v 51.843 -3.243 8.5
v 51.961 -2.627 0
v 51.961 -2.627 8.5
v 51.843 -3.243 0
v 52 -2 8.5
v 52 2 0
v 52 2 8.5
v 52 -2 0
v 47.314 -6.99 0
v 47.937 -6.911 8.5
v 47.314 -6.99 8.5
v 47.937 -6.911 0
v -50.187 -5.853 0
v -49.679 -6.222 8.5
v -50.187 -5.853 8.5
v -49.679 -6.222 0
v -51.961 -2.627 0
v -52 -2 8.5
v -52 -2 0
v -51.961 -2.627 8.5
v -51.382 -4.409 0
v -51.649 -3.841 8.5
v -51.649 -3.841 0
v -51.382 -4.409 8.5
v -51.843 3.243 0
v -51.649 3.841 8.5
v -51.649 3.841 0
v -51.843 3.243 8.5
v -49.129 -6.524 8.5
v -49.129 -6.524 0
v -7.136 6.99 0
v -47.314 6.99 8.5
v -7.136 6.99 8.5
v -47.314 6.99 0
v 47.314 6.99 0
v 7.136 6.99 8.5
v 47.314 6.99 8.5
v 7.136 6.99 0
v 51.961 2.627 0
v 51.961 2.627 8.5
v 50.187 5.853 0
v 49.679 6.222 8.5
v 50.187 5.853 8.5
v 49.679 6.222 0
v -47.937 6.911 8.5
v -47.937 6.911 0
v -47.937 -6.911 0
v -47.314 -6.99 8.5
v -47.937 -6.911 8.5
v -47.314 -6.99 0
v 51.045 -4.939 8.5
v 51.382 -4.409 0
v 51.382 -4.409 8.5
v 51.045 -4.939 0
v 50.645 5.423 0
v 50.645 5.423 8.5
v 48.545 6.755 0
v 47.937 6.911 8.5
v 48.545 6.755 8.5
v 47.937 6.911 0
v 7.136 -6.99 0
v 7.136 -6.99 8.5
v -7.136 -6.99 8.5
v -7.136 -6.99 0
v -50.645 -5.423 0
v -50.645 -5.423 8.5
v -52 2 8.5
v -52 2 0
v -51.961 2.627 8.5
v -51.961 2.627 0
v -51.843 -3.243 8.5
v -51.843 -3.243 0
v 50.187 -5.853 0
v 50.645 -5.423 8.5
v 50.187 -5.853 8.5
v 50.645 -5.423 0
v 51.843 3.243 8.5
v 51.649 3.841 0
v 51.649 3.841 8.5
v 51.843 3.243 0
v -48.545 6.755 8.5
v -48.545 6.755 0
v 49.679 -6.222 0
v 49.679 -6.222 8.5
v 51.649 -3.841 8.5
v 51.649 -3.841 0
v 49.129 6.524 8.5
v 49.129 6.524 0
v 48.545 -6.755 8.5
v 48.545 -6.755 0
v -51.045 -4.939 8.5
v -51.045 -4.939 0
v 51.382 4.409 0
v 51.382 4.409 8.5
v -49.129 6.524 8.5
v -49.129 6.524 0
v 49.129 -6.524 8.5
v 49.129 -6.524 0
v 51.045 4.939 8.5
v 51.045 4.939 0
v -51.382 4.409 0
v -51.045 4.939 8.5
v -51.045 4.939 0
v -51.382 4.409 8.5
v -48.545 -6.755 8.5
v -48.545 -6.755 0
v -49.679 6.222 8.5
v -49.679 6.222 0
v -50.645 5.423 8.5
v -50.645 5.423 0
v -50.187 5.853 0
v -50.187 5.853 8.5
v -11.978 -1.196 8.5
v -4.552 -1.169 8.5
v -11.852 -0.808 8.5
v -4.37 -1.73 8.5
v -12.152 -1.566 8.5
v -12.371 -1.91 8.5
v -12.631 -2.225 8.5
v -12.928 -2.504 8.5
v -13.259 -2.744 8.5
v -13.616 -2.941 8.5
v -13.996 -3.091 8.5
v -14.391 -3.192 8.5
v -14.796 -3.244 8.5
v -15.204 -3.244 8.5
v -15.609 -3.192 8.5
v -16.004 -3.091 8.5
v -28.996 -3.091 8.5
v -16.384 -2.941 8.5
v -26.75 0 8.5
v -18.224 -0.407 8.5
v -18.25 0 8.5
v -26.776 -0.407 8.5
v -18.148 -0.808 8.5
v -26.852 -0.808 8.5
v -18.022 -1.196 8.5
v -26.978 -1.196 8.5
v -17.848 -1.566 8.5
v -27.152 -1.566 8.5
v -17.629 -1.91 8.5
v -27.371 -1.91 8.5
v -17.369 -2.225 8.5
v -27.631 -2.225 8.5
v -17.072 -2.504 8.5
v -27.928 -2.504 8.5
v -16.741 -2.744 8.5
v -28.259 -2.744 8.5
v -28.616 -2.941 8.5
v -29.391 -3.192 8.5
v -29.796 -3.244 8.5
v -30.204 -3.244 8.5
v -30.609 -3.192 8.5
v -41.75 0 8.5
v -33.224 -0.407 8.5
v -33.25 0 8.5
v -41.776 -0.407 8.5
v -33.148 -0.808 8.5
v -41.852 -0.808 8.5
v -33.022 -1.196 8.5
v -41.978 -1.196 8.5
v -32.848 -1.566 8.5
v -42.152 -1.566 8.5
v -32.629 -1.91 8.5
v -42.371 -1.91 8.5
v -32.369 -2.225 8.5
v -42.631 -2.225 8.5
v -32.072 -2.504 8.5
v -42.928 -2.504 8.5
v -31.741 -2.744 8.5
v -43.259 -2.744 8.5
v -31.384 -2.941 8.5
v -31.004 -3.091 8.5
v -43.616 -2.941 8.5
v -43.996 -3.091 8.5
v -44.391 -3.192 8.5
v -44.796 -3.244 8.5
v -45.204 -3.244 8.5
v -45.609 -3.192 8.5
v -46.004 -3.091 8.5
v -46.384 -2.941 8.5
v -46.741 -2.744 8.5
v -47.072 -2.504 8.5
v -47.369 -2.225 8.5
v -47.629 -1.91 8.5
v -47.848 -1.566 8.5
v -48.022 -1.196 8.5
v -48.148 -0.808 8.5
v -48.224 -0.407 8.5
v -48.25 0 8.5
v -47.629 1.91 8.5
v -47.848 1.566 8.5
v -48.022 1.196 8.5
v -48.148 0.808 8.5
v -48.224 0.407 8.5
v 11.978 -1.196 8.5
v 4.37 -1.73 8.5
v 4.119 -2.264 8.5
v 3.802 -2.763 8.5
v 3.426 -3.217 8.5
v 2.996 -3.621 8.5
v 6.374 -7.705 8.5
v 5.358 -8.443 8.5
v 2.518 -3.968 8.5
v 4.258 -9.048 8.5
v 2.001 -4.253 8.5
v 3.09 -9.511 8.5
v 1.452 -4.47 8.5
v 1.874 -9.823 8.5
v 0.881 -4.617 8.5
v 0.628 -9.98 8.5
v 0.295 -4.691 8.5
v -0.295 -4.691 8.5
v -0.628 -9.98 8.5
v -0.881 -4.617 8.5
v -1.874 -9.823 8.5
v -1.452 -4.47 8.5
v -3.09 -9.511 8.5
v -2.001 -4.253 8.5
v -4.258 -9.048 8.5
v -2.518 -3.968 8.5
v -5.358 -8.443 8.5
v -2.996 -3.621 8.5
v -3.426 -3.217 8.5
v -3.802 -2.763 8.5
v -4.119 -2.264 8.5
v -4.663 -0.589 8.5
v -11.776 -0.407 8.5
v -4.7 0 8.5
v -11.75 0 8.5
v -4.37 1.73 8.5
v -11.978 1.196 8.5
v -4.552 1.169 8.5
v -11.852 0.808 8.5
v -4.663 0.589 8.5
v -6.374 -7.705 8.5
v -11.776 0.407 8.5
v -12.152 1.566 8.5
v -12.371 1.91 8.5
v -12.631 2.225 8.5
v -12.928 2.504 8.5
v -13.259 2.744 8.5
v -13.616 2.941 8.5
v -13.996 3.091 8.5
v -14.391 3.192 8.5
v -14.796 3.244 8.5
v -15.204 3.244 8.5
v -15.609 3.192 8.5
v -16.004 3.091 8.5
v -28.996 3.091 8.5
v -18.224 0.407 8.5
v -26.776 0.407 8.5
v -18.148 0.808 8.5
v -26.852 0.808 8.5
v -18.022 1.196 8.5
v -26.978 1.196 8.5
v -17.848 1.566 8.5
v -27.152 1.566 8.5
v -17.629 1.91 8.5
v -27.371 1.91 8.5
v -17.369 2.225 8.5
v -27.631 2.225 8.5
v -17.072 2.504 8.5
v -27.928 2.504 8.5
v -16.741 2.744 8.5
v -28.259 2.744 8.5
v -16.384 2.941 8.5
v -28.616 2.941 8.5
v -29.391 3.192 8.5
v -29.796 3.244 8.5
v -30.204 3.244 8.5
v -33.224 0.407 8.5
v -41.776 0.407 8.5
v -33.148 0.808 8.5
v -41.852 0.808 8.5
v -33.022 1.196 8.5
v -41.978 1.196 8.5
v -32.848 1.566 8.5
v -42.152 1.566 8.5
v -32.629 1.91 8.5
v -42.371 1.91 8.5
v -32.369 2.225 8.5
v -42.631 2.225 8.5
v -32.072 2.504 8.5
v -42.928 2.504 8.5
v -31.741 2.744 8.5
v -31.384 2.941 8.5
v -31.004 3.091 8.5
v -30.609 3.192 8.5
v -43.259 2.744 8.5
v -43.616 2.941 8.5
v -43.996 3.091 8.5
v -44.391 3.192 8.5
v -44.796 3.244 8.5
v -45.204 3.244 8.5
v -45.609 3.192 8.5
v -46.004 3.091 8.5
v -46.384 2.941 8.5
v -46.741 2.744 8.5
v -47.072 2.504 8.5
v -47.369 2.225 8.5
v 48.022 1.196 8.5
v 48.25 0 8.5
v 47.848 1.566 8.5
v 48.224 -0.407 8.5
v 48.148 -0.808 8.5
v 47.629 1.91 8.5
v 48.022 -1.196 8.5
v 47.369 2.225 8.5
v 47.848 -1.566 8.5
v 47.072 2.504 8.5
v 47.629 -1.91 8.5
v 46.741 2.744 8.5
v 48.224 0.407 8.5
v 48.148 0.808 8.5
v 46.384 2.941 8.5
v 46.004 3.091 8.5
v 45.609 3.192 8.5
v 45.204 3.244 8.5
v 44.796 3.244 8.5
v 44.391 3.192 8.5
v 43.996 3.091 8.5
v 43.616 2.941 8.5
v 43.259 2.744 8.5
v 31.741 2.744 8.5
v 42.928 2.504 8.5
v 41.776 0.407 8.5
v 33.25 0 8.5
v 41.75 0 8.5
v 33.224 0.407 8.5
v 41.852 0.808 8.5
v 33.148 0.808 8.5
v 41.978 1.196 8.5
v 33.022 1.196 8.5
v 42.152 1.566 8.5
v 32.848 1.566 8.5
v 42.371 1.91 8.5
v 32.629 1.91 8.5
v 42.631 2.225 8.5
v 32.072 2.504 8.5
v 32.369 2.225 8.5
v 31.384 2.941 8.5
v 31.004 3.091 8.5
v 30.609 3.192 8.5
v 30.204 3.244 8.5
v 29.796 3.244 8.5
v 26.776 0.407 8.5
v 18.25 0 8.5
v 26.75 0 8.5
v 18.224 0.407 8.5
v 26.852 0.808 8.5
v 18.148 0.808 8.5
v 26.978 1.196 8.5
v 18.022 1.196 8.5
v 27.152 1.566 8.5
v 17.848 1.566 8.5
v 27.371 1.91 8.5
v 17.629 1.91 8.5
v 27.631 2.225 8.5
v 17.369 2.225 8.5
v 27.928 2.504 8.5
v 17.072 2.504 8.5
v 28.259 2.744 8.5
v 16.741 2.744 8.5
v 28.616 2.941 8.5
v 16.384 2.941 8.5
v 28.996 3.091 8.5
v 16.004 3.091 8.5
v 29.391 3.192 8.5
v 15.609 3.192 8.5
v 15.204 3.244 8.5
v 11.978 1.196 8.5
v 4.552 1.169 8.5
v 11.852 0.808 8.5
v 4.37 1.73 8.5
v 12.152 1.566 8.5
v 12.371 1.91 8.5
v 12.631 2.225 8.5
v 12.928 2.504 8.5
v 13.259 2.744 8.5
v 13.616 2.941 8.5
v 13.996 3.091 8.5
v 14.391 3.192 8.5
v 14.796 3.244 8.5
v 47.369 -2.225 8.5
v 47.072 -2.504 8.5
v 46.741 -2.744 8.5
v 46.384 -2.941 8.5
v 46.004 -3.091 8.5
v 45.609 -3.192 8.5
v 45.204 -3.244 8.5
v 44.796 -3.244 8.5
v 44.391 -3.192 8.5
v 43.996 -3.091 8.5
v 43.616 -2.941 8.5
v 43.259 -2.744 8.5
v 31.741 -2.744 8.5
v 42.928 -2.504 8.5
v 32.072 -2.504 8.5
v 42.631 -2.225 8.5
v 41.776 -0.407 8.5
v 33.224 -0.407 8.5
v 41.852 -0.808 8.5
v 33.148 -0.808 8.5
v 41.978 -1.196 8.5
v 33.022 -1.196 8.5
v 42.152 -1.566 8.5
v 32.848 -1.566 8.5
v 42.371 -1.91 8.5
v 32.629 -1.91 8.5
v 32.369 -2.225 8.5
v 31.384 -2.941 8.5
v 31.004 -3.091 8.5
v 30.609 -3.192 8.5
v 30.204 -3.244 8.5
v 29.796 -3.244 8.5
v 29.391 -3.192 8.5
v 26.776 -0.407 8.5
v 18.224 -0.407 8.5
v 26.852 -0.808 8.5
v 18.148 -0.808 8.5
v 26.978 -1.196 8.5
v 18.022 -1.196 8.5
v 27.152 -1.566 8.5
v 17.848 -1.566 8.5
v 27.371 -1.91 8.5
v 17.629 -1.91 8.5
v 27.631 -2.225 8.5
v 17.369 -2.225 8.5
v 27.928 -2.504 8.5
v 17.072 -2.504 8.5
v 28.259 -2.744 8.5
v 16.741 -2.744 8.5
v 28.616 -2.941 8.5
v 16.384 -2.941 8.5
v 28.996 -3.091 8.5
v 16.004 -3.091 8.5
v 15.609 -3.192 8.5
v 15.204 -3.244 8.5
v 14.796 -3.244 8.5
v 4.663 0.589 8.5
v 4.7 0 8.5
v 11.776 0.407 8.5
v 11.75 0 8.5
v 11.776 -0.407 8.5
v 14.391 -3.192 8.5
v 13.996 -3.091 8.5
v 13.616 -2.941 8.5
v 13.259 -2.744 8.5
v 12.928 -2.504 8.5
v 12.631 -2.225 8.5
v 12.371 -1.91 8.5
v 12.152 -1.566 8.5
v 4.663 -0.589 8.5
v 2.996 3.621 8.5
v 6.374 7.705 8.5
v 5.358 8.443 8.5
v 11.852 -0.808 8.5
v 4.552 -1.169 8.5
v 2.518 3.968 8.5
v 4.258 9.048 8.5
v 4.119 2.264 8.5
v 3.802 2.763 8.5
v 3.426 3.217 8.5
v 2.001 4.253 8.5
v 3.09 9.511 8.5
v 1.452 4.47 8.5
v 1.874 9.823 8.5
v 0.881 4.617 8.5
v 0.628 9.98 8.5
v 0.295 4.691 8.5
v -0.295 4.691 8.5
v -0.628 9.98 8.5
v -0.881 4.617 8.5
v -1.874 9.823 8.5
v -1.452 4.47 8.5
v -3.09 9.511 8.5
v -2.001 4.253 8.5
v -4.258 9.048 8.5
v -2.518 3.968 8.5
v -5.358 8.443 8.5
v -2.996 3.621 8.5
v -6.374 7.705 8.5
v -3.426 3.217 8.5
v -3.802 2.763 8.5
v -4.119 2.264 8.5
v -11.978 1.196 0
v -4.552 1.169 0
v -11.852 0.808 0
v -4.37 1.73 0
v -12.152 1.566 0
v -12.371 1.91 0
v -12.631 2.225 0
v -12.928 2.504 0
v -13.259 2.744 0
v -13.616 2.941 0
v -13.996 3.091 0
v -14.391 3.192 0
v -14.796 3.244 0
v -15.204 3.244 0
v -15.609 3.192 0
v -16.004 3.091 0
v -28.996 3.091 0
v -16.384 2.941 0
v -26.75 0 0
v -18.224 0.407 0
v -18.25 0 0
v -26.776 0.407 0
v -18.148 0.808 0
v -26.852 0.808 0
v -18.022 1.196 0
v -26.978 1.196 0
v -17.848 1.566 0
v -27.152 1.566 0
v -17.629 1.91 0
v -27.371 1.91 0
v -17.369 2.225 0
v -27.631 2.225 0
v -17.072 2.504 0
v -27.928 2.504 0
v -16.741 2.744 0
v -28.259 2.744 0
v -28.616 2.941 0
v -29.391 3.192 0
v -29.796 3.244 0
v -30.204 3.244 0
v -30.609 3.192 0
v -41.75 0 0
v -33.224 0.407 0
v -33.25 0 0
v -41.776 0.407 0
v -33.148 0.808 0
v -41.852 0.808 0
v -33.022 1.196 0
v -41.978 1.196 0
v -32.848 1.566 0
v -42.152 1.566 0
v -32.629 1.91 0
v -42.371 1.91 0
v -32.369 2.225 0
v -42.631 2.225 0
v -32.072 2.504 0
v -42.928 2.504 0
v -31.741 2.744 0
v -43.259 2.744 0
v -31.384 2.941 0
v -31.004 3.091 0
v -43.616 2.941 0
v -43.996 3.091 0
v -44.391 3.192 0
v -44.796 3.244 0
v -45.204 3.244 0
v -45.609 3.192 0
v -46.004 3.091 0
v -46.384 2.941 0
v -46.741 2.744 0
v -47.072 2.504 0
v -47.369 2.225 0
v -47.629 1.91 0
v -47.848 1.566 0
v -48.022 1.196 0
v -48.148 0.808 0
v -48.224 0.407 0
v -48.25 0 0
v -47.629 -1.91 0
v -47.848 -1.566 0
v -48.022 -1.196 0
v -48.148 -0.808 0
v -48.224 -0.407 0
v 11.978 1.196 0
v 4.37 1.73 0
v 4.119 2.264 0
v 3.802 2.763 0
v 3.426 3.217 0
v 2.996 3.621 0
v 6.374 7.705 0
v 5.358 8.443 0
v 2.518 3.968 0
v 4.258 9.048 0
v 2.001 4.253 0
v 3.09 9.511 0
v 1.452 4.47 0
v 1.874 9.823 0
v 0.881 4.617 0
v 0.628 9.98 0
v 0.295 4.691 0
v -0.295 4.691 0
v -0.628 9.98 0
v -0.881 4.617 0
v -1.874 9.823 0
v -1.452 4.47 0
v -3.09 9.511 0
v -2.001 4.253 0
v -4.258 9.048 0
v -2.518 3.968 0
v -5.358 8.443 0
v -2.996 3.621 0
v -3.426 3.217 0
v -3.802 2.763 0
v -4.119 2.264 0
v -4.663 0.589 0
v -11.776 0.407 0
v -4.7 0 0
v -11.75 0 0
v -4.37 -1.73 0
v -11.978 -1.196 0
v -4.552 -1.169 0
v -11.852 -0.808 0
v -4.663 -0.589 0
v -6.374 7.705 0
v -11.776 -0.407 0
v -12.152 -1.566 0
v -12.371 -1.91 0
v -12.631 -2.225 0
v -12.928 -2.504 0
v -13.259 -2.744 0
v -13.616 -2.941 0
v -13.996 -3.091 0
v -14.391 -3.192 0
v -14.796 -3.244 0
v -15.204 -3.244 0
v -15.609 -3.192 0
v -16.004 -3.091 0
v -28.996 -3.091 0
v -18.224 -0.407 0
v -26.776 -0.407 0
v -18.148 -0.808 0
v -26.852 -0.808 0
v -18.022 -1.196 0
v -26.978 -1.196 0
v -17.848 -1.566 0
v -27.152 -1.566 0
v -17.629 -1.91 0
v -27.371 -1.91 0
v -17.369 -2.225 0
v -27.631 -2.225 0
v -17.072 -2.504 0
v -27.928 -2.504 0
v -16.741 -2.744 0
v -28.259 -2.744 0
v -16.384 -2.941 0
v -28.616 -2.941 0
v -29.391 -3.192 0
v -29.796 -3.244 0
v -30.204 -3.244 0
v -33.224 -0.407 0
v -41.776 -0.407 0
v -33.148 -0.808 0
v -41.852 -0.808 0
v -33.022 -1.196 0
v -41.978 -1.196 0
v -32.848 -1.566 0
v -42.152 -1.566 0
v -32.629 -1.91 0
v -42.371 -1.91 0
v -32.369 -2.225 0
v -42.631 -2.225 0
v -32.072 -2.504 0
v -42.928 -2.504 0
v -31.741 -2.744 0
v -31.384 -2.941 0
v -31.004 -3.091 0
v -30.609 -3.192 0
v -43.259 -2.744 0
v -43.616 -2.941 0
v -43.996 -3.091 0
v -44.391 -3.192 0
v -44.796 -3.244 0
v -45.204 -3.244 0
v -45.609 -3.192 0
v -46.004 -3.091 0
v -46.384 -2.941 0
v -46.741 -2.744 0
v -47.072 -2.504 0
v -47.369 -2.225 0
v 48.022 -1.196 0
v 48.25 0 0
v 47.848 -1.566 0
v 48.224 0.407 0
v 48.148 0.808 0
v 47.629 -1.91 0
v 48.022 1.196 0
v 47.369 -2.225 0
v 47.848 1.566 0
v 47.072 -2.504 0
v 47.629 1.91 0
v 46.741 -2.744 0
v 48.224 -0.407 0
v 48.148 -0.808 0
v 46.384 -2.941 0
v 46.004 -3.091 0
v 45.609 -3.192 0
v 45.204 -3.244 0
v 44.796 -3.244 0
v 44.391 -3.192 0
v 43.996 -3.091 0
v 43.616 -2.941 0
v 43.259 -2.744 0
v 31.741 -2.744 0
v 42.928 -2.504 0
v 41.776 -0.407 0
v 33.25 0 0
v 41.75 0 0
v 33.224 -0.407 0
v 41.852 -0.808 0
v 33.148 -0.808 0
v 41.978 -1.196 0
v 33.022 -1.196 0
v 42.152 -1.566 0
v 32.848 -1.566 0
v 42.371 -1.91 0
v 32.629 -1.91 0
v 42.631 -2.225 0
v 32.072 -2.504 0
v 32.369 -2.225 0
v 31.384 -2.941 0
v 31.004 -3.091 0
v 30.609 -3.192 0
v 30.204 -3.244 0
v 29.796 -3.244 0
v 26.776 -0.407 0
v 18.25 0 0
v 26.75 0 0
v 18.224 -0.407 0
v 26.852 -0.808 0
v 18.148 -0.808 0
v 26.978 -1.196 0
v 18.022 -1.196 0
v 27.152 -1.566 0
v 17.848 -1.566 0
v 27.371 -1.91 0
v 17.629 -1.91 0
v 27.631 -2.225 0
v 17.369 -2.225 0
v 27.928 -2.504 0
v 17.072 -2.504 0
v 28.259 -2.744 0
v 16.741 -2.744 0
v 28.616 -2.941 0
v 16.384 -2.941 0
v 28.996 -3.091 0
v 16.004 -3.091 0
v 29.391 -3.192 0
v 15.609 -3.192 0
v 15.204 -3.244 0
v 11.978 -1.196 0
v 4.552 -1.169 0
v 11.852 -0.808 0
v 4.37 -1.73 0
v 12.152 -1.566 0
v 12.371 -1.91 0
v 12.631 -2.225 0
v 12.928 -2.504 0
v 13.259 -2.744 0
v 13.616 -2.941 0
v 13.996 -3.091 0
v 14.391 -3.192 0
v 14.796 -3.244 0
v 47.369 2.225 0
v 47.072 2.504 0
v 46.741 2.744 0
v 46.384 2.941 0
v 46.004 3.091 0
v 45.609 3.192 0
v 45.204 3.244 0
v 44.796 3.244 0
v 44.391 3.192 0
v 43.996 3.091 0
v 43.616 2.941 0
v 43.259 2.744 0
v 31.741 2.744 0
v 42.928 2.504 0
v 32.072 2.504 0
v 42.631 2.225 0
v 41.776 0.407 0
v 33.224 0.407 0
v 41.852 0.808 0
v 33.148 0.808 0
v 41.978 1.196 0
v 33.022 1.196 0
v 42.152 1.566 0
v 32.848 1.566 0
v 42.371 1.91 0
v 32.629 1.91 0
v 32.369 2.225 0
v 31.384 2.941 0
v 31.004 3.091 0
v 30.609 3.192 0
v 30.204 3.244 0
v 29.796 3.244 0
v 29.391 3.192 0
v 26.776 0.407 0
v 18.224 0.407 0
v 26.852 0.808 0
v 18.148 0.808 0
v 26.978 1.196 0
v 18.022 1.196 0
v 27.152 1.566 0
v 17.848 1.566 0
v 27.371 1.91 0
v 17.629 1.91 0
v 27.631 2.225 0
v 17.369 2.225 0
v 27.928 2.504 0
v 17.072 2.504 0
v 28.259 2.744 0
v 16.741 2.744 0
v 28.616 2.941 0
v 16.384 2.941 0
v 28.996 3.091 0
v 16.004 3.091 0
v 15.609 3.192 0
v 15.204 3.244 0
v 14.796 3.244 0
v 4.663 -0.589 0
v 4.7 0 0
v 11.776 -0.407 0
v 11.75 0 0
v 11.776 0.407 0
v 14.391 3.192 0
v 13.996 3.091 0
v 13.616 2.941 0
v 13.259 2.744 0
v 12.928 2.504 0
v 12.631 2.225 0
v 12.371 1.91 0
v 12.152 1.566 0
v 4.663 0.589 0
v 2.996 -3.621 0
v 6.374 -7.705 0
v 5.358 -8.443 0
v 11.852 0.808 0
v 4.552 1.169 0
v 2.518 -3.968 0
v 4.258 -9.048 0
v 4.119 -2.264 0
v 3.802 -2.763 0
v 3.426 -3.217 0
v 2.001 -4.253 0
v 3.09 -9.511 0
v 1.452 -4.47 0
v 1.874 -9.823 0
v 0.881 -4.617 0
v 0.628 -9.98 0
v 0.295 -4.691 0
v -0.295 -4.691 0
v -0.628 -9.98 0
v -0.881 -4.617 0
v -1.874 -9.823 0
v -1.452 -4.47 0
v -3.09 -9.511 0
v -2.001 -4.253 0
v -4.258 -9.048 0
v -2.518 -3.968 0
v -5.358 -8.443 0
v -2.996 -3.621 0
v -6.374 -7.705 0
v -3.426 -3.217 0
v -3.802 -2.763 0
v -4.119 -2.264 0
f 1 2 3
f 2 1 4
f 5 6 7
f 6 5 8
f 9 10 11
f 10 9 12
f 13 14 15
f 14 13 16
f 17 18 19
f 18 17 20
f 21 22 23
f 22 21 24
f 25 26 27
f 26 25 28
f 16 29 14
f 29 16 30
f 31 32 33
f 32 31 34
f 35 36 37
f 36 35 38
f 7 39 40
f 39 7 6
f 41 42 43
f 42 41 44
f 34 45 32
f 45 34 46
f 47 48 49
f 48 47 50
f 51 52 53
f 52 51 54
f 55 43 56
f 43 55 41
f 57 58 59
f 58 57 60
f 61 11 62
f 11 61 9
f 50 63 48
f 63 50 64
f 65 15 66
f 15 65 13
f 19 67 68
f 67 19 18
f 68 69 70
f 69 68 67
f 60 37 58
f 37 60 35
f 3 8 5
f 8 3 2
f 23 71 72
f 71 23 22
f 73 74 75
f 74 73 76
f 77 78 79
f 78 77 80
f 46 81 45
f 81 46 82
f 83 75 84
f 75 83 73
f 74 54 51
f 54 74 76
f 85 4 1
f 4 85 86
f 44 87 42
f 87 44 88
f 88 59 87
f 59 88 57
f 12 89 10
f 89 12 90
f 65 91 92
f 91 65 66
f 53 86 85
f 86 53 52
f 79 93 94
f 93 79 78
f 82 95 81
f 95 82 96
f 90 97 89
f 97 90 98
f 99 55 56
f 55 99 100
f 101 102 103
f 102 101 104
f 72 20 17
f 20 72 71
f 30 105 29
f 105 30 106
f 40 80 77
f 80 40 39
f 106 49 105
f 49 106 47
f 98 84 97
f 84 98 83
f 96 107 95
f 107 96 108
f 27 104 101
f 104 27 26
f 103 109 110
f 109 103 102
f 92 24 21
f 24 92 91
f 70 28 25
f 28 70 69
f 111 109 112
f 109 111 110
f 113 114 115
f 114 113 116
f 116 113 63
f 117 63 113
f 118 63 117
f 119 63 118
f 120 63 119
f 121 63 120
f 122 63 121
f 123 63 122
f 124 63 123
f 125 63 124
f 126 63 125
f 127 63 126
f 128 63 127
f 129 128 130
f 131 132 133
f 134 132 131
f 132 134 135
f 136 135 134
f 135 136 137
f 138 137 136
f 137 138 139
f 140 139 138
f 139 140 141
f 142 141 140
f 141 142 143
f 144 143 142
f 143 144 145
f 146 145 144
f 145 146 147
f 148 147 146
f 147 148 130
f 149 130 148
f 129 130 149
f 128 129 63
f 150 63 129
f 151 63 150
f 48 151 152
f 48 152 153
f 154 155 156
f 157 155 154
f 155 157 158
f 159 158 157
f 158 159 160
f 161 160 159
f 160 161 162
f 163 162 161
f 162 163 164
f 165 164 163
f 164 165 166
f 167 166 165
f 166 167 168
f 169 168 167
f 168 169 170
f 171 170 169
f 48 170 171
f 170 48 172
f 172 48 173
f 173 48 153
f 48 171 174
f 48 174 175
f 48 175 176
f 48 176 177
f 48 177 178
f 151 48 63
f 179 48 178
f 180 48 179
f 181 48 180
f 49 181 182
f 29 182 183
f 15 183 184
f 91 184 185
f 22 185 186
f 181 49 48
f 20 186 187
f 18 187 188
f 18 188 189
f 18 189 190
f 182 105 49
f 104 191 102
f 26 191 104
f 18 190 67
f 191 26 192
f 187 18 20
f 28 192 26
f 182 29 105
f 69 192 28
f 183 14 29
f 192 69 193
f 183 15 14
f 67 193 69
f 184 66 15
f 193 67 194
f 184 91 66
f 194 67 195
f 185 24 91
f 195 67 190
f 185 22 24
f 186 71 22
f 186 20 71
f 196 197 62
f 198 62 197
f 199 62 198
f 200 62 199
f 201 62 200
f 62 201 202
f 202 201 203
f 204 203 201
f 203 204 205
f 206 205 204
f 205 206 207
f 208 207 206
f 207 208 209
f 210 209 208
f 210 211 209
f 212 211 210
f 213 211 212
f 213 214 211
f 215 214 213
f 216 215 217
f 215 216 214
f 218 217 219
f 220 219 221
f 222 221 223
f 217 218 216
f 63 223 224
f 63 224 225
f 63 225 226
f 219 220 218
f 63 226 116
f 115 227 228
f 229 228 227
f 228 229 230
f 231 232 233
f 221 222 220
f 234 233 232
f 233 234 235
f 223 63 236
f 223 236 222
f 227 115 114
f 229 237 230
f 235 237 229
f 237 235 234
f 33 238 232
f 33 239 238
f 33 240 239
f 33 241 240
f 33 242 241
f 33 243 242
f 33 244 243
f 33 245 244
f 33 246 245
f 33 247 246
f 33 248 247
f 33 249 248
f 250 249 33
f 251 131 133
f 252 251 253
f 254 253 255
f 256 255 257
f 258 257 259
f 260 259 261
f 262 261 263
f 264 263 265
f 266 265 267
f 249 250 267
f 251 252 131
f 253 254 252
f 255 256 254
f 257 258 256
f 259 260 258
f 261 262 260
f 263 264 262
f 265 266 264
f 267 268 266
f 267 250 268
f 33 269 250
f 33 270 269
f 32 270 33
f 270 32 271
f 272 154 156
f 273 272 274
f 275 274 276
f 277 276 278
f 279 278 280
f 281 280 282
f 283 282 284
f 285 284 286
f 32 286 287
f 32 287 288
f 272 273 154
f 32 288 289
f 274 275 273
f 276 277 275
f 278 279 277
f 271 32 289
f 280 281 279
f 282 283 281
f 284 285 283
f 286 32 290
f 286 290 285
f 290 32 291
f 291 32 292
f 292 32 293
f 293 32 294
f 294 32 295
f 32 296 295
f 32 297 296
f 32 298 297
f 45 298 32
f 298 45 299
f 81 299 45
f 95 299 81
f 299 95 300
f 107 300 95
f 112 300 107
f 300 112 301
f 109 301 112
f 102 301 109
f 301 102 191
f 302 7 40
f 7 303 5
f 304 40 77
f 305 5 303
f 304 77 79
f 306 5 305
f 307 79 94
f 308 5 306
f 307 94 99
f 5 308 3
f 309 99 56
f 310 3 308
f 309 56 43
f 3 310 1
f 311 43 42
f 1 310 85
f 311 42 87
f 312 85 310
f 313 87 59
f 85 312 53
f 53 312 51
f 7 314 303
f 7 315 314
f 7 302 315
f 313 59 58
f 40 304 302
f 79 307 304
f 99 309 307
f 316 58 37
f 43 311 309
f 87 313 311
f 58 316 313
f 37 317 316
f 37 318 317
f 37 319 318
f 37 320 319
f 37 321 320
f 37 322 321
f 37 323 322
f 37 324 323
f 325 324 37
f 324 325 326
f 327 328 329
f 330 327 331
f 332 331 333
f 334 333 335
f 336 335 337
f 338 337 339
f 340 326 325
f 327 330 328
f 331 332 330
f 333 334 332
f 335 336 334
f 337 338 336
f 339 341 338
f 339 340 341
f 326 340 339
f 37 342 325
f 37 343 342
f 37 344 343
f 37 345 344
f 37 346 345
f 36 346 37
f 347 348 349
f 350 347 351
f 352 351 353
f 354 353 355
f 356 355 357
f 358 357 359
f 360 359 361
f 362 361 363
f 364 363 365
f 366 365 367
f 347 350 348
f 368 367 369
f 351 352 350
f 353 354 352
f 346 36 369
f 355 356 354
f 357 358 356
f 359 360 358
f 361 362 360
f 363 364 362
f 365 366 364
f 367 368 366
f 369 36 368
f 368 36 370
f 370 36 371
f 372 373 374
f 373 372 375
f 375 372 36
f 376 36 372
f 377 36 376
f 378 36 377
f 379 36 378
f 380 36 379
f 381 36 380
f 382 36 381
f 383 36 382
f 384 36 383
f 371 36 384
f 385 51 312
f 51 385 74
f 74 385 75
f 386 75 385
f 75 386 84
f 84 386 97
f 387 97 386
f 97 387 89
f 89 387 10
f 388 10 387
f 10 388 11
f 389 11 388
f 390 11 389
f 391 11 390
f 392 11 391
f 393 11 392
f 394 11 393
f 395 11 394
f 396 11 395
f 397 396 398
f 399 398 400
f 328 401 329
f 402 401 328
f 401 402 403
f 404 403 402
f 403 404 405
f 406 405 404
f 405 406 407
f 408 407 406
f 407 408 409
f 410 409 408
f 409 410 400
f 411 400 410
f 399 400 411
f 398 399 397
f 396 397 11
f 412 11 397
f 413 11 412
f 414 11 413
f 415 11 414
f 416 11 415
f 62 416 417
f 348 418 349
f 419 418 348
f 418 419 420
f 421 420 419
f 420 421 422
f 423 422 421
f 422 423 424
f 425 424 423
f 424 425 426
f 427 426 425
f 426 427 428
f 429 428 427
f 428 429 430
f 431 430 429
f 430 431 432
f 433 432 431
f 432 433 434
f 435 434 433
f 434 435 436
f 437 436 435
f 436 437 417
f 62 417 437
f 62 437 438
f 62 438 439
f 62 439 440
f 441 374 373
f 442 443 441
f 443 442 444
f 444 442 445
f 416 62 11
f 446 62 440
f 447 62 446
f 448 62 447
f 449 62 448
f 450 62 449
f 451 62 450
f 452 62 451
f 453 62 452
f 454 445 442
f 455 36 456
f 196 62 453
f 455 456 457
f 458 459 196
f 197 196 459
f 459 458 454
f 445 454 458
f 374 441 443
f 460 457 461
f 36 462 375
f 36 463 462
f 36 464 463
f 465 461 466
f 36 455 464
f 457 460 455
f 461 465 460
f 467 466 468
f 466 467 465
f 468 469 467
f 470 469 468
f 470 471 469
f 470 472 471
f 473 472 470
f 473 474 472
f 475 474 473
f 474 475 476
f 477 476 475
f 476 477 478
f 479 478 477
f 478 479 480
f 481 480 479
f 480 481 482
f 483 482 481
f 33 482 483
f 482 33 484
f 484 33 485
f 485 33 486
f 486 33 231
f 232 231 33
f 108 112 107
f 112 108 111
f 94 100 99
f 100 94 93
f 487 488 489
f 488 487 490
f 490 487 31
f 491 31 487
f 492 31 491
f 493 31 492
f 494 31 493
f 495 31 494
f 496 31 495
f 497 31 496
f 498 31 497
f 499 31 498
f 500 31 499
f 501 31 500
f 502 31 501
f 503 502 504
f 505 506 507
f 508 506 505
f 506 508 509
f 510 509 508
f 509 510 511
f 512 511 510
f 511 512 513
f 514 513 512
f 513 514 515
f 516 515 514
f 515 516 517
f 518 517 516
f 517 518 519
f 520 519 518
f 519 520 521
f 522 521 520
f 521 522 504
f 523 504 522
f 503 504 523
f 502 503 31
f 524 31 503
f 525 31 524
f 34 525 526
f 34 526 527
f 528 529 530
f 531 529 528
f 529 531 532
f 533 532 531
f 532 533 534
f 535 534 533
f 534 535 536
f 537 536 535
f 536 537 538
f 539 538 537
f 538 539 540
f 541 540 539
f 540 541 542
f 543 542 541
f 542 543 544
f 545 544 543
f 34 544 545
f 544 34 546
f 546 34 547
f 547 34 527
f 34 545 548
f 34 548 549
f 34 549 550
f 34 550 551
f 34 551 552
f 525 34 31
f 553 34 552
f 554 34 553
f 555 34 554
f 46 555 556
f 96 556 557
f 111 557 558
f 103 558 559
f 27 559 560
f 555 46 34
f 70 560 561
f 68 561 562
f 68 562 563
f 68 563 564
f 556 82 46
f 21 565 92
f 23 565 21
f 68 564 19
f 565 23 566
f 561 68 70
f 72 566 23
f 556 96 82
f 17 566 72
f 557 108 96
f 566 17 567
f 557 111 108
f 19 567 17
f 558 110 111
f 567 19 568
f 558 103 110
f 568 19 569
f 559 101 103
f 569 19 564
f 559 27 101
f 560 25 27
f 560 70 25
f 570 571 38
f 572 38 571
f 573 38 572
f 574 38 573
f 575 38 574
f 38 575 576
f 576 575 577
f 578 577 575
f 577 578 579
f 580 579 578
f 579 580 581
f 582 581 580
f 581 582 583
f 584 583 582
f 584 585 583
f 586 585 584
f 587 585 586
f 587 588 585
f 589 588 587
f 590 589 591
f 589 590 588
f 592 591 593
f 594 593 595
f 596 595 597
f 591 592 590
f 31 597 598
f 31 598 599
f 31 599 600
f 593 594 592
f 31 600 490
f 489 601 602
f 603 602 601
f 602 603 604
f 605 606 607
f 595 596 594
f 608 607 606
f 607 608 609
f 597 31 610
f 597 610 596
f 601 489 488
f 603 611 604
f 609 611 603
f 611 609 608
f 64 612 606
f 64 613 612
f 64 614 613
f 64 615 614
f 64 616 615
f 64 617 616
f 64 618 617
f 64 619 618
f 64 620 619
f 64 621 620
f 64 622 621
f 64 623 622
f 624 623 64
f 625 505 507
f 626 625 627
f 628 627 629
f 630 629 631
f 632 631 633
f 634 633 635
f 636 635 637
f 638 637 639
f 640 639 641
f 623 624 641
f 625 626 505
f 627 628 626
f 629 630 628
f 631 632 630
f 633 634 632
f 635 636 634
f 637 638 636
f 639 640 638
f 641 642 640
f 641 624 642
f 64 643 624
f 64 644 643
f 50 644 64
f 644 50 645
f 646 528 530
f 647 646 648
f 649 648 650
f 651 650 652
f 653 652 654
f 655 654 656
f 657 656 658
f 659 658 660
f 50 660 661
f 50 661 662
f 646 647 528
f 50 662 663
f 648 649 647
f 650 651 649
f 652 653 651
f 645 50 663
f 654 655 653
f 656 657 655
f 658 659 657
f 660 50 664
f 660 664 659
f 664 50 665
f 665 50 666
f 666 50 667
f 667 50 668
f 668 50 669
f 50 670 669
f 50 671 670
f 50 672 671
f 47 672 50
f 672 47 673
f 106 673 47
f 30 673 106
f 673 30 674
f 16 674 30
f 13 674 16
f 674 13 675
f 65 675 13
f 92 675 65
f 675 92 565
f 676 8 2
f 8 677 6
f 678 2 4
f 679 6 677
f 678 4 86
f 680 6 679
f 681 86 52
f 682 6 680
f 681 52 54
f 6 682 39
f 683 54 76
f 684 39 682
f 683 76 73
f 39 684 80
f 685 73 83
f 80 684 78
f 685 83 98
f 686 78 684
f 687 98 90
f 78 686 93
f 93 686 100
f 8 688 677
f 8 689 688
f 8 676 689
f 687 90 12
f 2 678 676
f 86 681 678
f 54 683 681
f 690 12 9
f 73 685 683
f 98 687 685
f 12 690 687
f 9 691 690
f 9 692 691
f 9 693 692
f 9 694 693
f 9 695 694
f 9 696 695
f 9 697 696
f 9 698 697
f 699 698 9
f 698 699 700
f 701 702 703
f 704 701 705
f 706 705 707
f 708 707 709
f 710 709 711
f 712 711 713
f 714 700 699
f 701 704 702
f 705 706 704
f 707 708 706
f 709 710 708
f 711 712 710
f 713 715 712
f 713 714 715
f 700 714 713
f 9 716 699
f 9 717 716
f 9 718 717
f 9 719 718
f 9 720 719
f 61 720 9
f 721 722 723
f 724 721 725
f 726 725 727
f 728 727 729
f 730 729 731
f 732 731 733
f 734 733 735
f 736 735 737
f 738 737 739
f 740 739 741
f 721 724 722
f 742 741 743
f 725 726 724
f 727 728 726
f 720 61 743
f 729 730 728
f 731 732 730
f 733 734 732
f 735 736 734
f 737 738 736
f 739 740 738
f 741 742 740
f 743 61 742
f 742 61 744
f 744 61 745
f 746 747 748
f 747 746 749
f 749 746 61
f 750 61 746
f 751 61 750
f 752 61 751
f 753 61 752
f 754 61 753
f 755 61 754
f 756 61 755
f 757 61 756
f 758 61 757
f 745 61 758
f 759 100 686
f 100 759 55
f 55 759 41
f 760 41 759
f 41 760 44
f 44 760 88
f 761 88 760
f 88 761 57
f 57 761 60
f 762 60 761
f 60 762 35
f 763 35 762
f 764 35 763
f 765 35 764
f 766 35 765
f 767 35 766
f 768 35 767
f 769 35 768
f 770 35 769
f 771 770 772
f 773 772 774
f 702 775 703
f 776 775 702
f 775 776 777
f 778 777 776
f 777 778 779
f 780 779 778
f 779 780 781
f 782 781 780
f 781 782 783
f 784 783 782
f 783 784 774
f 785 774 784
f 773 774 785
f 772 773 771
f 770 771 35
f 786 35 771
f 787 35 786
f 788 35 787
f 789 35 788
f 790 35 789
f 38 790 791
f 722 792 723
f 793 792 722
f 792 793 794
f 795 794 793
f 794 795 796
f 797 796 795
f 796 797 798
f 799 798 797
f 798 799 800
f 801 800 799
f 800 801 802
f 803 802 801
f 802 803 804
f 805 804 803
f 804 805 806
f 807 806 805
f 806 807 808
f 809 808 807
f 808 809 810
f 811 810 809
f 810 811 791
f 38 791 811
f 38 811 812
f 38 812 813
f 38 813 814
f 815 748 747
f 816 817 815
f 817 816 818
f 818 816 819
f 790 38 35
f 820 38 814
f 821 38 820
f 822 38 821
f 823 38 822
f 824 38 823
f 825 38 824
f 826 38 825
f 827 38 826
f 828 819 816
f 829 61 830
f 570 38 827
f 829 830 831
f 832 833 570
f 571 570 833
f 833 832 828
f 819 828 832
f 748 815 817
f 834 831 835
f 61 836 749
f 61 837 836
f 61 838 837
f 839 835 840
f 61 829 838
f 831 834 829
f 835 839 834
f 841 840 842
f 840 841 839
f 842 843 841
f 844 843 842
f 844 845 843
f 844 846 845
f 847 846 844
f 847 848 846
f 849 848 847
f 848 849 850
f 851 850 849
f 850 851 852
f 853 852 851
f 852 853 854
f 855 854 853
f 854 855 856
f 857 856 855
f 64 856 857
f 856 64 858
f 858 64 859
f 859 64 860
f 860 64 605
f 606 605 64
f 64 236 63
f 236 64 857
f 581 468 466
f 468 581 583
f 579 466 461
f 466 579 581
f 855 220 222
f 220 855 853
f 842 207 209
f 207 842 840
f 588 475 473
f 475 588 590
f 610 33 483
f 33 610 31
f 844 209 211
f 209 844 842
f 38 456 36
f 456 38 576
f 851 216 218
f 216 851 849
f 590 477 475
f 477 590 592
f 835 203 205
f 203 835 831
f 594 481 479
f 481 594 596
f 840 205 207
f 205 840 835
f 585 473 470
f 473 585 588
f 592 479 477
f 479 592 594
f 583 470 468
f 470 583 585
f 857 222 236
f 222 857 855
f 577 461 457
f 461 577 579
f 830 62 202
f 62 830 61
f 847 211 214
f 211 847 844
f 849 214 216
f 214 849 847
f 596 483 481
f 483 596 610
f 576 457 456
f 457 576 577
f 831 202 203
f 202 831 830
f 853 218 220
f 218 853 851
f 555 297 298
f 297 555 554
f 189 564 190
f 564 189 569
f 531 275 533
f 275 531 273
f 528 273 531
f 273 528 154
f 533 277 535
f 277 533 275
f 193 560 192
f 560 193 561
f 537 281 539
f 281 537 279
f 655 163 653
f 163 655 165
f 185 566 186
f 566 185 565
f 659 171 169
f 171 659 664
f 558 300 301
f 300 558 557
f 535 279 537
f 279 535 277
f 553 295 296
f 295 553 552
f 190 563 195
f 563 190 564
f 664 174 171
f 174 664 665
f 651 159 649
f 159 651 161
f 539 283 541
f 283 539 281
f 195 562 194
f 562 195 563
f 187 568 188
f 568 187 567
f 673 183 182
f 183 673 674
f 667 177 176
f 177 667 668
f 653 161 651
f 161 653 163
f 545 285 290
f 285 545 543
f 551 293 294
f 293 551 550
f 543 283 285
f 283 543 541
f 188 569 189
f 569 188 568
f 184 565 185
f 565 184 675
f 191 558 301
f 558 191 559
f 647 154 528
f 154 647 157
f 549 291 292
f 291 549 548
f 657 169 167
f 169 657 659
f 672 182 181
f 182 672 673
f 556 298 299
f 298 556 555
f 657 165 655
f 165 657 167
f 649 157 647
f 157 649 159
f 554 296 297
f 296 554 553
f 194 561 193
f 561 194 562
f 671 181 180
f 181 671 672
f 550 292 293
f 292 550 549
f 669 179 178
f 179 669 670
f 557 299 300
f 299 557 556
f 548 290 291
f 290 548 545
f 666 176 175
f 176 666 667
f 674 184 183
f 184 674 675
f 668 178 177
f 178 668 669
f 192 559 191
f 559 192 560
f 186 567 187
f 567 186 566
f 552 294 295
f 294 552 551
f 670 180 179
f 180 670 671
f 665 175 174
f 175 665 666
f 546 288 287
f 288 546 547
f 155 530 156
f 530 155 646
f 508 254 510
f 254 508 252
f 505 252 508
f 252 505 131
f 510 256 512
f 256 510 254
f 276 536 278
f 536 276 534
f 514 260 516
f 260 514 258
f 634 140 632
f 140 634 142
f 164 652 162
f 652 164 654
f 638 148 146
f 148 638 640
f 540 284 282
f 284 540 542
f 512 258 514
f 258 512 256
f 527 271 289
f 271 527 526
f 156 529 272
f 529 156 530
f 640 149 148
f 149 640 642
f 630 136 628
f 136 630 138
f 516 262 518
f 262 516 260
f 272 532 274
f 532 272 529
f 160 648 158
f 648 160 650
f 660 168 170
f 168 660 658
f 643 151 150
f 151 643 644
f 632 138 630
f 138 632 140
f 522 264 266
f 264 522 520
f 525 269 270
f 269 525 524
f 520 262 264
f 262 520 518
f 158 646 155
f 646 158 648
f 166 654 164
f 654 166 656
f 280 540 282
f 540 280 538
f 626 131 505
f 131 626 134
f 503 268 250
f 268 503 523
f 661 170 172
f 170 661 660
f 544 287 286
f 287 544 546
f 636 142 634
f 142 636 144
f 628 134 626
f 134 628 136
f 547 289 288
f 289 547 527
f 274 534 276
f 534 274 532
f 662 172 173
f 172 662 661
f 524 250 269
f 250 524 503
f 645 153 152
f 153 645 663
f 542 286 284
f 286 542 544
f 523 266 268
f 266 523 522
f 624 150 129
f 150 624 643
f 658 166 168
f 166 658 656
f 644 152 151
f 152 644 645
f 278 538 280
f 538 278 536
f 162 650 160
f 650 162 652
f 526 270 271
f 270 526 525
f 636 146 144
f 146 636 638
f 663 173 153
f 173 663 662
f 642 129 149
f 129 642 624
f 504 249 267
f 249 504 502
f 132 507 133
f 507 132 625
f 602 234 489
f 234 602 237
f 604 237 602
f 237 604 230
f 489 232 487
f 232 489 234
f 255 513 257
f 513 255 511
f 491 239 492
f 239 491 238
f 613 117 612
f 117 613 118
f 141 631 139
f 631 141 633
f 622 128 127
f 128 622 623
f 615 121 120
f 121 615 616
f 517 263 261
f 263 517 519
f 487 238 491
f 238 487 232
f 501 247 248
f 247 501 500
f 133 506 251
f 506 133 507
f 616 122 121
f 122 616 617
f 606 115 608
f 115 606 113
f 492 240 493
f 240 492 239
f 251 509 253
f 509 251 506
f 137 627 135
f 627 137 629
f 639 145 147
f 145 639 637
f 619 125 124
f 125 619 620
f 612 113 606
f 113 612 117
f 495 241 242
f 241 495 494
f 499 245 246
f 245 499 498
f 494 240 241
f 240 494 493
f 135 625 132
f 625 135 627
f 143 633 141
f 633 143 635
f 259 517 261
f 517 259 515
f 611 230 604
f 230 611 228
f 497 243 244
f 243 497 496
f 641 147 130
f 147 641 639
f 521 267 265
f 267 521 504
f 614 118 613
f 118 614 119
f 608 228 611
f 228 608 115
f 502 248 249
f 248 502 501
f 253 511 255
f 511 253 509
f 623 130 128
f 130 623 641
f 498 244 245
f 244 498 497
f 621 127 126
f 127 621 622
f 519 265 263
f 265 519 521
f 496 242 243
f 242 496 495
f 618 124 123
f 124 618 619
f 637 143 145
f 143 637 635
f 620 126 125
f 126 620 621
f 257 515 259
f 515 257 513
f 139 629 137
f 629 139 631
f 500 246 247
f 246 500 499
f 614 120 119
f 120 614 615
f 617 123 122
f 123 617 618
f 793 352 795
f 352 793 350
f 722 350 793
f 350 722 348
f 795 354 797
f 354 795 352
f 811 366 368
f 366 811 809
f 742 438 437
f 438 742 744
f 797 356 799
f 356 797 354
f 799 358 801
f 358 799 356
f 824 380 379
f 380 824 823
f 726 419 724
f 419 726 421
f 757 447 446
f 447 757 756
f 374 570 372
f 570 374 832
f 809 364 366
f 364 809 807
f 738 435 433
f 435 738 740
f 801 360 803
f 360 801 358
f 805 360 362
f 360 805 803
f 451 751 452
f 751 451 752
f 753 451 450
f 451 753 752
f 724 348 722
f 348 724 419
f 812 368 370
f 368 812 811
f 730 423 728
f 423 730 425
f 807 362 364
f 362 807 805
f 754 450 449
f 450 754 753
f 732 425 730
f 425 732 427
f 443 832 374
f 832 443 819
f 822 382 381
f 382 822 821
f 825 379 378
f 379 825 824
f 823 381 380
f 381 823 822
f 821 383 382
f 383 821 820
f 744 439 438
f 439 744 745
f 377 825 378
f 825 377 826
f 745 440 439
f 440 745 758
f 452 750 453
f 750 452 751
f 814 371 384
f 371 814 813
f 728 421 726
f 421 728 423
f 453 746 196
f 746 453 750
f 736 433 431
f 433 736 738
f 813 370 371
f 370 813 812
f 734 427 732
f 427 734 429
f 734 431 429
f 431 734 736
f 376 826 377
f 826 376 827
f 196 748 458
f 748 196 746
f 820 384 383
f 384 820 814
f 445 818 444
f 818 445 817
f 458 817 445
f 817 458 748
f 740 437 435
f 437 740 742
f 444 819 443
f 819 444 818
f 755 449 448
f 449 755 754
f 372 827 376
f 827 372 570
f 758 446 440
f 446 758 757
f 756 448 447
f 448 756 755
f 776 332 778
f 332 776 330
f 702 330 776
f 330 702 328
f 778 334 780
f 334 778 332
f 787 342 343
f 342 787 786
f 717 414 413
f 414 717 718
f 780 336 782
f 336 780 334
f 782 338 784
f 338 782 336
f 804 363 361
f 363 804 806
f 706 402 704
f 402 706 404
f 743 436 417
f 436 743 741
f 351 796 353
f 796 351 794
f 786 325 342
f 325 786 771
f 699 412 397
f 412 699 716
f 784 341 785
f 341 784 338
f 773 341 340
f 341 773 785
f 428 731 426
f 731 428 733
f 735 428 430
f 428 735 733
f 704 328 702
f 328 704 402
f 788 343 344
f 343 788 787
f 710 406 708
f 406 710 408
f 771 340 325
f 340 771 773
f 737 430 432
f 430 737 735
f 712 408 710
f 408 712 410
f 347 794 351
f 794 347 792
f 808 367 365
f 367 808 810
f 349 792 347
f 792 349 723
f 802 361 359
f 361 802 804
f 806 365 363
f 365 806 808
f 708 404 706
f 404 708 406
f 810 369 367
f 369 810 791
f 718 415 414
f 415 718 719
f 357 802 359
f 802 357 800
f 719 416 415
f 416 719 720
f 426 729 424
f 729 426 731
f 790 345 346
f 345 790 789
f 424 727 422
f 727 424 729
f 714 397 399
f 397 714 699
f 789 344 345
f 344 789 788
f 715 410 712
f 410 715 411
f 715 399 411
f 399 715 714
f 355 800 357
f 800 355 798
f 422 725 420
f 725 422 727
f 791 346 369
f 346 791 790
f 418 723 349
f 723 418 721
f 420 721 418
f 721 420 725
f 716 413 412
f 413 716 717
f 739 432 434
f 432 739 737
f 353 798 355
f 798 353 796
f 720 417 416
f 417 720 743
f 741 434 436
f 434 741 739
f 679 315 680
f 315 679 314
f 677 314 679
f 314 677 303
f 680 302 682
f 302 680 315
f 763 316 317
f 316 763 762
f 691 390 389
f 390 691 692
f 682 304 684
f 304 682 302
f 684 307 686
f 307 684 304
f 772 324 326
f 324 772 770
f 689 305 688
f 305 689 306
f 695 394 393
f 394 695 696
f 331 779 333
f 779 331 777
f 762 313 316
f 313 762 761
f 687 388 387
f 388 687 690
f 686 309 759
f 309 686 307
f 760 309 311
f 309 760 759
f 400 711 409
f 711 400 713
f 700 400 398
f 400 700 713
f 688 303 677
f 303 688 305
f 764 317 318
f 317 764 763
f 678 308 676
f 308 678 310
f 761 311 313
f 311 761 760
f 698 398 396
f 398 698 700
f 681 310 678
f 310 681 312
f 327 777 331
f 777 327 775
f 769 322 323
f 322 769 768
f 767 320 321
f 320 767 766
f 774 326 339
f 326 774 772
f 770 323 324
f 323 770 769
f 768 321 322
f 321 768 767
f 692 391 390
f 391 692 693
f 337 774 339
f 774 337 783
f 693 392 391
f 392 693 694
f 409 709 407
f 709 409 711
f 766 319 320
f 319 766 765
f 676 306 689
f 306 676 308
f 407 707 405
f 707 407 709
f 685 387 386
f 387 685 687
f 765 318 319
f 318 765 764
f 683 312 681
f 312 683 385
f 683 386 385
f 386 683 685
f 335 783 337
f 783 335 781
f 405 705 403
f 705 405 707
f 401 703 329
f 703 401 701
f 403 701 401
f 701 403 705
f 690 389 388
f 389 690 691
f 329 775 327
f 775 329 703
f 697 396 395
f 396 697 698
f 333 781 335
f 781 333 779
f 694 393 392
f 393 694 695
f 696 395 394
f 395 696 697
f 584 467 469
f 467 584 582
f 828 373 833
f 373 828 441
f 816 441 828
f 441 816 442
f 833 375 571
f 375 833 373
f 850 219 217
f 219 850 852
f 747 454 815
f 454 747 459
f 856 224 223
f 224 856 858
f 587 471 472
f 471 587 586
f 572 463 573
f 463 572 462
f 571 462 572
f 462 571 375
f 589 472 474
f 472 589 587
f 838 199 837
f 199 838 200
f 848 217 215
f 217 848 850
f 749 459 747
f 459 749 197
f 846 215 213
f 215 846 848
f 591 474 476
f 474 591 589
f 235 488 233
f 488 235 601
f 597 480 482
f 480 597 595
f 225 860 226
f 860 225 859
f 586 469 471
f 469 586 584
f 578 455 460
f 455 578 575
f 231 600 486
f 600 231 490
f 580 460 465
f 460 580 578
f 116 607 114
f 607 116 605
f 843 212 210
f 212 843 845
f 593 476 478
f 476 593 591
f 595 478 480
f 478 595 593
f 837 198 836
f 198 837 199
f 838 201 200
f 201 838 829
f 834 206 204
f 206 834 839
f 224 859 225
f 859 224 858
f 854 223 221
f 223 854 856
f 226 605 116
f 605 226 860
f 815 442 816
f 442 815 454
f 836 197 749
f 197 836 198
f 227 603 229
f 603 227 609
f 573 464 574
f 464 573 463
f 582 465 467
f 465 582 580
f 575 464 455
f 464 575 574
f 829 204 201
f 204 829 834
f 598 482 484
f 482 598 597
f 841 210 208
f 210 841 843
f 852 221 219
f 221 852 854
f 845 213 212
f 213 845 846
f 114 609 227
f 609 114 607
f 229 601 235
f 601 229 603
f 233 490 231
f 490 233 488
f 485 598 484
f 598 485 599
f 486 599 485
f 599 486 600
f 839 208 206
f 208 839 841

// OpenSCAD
$fn = 50;


difference() {
	union() {
		*color(alpha = 1.0000000000, c = "gray") {
			translate(v = [0, 7, 0]) {
				linear_extrude(height = 1) {
					text(font = "Arial:style=Bold", halign = "center", size = 4.5000000000, text = "COMMENT plate main", valign = "center");
				}
			}
		}
		*color(alpha = 1.0000000000, c = "gray") {
			translate(v = [0, 14, 0]) {
				linear_extrude(height = 1) {
					text(font = "Arial:style=Bold", halign = "center", size = 4.5000000000, text = "COMMENT description oobb_plate_shape_p_type_8.5_depth_7_width_1_height_8.5_thickness_slip_center_extra", valign = "center");
				}
			}
		}
		hull() {
			translate(v = [-47.0000000000, 2.0000000000, 0]) {
				cylinder(h = 8.5000000000, r = 5);
			}
			translate(v = [47.0000000000, 2.0000000000, 0]) {
				cylinder(h = 8.5000000000, r = 5);
			}
			translate(v = [-47.0000000000, -2.0000000000, 0]) {
				cylinder(h = 8.5000000000, r = 5);
			}
			translate(v = [47.0000000000, -2.0000000000, 0]) {
				cylinder(h = 8.5000000000, r = 5);
			}
		}
		cylinder(h = 8.5000000000, r = 10.0000000000);
	}
	union() {
		*color(alpha = 1.0000000000, c = "gray") {
			translate(v = [0, 7, 0]) {
				linear_extrude(height = 1) {
					text(font = "Arial:style=Bold", halign = "center", size = 4.5000000000, text = "COMMENT holes main", valign = "center");
				}
			}
		}
		*color(alpha = 1.0000000000, c = "gray") {
			translate(v = [0, 14, 0]) {
				linear_extrude(height = 1) {
					text(font = "Arial:style=Bold", halign = "center", size = 4.5000000000, text = "COMMENT description oobb_holes_shape_n_type_7_width_1_height_8.5_thickness_slip_center_extra_false_both_holes", valign = "center");
				}
			}
		}
		translate(v = [-45.0000000000, 0.0000000000, 0]) {
			translate(v = [0, 0, -50]) {
				cylinder(h = 100, r = 3.2500000000);
			}
		}
		translate(v = [-30.0000000000, 0.0000000000, 0]) {
			translate(v = [0, 0, -50]) {
				cylinder(h = 100, r = 3.2500000000);
			}
		}
		translate(v = [-15.0000000000, 0.0000000000, 0]) {
			translate(v = [0, 0, -50]) {
				cylinder(h = 100, r = 3.2500000000);
			}
		}
		translate(v = [0, 0, -50]) {
			cylinder(h = 100, r = 3.2500000000);
		}
		translate(v = [15.0000000000, 0.0000000000, 0]) {
			translate(v = [0, 0, -50]) {
				cylinder(h = 100, r = 3.2500000000);
			}
		}
		translate(v = [30.0000000000, 0.0000000000, 0]) {
			translate(v = [0, 0, -50]) {
				cylinder(h = 100, r = 3.2500000000);
			}
		}
		translate(v = [45.0000000000, 0.0000000000, 0]) {
			translate(v = [0, 0, -50]) {
				cylinder(h = 100, r = 3.2500000000);
			}
		}
		*color(alpha = 1.0000000000, c = "gray") {
			translate(v = [0, 7, 0]) {
				linear_extrude(height = 1) {
					text(font = "Arial:style=Bold", halign = "center", size = 4.5000000000, text = "COMMENT extra slip_center", valign = "center");
				}
			}
		}
		translate(v = [0, 0, -50.0000000000]) {
			cylinder(h = 100, r = 4.7000000000);
		}
	}
}
